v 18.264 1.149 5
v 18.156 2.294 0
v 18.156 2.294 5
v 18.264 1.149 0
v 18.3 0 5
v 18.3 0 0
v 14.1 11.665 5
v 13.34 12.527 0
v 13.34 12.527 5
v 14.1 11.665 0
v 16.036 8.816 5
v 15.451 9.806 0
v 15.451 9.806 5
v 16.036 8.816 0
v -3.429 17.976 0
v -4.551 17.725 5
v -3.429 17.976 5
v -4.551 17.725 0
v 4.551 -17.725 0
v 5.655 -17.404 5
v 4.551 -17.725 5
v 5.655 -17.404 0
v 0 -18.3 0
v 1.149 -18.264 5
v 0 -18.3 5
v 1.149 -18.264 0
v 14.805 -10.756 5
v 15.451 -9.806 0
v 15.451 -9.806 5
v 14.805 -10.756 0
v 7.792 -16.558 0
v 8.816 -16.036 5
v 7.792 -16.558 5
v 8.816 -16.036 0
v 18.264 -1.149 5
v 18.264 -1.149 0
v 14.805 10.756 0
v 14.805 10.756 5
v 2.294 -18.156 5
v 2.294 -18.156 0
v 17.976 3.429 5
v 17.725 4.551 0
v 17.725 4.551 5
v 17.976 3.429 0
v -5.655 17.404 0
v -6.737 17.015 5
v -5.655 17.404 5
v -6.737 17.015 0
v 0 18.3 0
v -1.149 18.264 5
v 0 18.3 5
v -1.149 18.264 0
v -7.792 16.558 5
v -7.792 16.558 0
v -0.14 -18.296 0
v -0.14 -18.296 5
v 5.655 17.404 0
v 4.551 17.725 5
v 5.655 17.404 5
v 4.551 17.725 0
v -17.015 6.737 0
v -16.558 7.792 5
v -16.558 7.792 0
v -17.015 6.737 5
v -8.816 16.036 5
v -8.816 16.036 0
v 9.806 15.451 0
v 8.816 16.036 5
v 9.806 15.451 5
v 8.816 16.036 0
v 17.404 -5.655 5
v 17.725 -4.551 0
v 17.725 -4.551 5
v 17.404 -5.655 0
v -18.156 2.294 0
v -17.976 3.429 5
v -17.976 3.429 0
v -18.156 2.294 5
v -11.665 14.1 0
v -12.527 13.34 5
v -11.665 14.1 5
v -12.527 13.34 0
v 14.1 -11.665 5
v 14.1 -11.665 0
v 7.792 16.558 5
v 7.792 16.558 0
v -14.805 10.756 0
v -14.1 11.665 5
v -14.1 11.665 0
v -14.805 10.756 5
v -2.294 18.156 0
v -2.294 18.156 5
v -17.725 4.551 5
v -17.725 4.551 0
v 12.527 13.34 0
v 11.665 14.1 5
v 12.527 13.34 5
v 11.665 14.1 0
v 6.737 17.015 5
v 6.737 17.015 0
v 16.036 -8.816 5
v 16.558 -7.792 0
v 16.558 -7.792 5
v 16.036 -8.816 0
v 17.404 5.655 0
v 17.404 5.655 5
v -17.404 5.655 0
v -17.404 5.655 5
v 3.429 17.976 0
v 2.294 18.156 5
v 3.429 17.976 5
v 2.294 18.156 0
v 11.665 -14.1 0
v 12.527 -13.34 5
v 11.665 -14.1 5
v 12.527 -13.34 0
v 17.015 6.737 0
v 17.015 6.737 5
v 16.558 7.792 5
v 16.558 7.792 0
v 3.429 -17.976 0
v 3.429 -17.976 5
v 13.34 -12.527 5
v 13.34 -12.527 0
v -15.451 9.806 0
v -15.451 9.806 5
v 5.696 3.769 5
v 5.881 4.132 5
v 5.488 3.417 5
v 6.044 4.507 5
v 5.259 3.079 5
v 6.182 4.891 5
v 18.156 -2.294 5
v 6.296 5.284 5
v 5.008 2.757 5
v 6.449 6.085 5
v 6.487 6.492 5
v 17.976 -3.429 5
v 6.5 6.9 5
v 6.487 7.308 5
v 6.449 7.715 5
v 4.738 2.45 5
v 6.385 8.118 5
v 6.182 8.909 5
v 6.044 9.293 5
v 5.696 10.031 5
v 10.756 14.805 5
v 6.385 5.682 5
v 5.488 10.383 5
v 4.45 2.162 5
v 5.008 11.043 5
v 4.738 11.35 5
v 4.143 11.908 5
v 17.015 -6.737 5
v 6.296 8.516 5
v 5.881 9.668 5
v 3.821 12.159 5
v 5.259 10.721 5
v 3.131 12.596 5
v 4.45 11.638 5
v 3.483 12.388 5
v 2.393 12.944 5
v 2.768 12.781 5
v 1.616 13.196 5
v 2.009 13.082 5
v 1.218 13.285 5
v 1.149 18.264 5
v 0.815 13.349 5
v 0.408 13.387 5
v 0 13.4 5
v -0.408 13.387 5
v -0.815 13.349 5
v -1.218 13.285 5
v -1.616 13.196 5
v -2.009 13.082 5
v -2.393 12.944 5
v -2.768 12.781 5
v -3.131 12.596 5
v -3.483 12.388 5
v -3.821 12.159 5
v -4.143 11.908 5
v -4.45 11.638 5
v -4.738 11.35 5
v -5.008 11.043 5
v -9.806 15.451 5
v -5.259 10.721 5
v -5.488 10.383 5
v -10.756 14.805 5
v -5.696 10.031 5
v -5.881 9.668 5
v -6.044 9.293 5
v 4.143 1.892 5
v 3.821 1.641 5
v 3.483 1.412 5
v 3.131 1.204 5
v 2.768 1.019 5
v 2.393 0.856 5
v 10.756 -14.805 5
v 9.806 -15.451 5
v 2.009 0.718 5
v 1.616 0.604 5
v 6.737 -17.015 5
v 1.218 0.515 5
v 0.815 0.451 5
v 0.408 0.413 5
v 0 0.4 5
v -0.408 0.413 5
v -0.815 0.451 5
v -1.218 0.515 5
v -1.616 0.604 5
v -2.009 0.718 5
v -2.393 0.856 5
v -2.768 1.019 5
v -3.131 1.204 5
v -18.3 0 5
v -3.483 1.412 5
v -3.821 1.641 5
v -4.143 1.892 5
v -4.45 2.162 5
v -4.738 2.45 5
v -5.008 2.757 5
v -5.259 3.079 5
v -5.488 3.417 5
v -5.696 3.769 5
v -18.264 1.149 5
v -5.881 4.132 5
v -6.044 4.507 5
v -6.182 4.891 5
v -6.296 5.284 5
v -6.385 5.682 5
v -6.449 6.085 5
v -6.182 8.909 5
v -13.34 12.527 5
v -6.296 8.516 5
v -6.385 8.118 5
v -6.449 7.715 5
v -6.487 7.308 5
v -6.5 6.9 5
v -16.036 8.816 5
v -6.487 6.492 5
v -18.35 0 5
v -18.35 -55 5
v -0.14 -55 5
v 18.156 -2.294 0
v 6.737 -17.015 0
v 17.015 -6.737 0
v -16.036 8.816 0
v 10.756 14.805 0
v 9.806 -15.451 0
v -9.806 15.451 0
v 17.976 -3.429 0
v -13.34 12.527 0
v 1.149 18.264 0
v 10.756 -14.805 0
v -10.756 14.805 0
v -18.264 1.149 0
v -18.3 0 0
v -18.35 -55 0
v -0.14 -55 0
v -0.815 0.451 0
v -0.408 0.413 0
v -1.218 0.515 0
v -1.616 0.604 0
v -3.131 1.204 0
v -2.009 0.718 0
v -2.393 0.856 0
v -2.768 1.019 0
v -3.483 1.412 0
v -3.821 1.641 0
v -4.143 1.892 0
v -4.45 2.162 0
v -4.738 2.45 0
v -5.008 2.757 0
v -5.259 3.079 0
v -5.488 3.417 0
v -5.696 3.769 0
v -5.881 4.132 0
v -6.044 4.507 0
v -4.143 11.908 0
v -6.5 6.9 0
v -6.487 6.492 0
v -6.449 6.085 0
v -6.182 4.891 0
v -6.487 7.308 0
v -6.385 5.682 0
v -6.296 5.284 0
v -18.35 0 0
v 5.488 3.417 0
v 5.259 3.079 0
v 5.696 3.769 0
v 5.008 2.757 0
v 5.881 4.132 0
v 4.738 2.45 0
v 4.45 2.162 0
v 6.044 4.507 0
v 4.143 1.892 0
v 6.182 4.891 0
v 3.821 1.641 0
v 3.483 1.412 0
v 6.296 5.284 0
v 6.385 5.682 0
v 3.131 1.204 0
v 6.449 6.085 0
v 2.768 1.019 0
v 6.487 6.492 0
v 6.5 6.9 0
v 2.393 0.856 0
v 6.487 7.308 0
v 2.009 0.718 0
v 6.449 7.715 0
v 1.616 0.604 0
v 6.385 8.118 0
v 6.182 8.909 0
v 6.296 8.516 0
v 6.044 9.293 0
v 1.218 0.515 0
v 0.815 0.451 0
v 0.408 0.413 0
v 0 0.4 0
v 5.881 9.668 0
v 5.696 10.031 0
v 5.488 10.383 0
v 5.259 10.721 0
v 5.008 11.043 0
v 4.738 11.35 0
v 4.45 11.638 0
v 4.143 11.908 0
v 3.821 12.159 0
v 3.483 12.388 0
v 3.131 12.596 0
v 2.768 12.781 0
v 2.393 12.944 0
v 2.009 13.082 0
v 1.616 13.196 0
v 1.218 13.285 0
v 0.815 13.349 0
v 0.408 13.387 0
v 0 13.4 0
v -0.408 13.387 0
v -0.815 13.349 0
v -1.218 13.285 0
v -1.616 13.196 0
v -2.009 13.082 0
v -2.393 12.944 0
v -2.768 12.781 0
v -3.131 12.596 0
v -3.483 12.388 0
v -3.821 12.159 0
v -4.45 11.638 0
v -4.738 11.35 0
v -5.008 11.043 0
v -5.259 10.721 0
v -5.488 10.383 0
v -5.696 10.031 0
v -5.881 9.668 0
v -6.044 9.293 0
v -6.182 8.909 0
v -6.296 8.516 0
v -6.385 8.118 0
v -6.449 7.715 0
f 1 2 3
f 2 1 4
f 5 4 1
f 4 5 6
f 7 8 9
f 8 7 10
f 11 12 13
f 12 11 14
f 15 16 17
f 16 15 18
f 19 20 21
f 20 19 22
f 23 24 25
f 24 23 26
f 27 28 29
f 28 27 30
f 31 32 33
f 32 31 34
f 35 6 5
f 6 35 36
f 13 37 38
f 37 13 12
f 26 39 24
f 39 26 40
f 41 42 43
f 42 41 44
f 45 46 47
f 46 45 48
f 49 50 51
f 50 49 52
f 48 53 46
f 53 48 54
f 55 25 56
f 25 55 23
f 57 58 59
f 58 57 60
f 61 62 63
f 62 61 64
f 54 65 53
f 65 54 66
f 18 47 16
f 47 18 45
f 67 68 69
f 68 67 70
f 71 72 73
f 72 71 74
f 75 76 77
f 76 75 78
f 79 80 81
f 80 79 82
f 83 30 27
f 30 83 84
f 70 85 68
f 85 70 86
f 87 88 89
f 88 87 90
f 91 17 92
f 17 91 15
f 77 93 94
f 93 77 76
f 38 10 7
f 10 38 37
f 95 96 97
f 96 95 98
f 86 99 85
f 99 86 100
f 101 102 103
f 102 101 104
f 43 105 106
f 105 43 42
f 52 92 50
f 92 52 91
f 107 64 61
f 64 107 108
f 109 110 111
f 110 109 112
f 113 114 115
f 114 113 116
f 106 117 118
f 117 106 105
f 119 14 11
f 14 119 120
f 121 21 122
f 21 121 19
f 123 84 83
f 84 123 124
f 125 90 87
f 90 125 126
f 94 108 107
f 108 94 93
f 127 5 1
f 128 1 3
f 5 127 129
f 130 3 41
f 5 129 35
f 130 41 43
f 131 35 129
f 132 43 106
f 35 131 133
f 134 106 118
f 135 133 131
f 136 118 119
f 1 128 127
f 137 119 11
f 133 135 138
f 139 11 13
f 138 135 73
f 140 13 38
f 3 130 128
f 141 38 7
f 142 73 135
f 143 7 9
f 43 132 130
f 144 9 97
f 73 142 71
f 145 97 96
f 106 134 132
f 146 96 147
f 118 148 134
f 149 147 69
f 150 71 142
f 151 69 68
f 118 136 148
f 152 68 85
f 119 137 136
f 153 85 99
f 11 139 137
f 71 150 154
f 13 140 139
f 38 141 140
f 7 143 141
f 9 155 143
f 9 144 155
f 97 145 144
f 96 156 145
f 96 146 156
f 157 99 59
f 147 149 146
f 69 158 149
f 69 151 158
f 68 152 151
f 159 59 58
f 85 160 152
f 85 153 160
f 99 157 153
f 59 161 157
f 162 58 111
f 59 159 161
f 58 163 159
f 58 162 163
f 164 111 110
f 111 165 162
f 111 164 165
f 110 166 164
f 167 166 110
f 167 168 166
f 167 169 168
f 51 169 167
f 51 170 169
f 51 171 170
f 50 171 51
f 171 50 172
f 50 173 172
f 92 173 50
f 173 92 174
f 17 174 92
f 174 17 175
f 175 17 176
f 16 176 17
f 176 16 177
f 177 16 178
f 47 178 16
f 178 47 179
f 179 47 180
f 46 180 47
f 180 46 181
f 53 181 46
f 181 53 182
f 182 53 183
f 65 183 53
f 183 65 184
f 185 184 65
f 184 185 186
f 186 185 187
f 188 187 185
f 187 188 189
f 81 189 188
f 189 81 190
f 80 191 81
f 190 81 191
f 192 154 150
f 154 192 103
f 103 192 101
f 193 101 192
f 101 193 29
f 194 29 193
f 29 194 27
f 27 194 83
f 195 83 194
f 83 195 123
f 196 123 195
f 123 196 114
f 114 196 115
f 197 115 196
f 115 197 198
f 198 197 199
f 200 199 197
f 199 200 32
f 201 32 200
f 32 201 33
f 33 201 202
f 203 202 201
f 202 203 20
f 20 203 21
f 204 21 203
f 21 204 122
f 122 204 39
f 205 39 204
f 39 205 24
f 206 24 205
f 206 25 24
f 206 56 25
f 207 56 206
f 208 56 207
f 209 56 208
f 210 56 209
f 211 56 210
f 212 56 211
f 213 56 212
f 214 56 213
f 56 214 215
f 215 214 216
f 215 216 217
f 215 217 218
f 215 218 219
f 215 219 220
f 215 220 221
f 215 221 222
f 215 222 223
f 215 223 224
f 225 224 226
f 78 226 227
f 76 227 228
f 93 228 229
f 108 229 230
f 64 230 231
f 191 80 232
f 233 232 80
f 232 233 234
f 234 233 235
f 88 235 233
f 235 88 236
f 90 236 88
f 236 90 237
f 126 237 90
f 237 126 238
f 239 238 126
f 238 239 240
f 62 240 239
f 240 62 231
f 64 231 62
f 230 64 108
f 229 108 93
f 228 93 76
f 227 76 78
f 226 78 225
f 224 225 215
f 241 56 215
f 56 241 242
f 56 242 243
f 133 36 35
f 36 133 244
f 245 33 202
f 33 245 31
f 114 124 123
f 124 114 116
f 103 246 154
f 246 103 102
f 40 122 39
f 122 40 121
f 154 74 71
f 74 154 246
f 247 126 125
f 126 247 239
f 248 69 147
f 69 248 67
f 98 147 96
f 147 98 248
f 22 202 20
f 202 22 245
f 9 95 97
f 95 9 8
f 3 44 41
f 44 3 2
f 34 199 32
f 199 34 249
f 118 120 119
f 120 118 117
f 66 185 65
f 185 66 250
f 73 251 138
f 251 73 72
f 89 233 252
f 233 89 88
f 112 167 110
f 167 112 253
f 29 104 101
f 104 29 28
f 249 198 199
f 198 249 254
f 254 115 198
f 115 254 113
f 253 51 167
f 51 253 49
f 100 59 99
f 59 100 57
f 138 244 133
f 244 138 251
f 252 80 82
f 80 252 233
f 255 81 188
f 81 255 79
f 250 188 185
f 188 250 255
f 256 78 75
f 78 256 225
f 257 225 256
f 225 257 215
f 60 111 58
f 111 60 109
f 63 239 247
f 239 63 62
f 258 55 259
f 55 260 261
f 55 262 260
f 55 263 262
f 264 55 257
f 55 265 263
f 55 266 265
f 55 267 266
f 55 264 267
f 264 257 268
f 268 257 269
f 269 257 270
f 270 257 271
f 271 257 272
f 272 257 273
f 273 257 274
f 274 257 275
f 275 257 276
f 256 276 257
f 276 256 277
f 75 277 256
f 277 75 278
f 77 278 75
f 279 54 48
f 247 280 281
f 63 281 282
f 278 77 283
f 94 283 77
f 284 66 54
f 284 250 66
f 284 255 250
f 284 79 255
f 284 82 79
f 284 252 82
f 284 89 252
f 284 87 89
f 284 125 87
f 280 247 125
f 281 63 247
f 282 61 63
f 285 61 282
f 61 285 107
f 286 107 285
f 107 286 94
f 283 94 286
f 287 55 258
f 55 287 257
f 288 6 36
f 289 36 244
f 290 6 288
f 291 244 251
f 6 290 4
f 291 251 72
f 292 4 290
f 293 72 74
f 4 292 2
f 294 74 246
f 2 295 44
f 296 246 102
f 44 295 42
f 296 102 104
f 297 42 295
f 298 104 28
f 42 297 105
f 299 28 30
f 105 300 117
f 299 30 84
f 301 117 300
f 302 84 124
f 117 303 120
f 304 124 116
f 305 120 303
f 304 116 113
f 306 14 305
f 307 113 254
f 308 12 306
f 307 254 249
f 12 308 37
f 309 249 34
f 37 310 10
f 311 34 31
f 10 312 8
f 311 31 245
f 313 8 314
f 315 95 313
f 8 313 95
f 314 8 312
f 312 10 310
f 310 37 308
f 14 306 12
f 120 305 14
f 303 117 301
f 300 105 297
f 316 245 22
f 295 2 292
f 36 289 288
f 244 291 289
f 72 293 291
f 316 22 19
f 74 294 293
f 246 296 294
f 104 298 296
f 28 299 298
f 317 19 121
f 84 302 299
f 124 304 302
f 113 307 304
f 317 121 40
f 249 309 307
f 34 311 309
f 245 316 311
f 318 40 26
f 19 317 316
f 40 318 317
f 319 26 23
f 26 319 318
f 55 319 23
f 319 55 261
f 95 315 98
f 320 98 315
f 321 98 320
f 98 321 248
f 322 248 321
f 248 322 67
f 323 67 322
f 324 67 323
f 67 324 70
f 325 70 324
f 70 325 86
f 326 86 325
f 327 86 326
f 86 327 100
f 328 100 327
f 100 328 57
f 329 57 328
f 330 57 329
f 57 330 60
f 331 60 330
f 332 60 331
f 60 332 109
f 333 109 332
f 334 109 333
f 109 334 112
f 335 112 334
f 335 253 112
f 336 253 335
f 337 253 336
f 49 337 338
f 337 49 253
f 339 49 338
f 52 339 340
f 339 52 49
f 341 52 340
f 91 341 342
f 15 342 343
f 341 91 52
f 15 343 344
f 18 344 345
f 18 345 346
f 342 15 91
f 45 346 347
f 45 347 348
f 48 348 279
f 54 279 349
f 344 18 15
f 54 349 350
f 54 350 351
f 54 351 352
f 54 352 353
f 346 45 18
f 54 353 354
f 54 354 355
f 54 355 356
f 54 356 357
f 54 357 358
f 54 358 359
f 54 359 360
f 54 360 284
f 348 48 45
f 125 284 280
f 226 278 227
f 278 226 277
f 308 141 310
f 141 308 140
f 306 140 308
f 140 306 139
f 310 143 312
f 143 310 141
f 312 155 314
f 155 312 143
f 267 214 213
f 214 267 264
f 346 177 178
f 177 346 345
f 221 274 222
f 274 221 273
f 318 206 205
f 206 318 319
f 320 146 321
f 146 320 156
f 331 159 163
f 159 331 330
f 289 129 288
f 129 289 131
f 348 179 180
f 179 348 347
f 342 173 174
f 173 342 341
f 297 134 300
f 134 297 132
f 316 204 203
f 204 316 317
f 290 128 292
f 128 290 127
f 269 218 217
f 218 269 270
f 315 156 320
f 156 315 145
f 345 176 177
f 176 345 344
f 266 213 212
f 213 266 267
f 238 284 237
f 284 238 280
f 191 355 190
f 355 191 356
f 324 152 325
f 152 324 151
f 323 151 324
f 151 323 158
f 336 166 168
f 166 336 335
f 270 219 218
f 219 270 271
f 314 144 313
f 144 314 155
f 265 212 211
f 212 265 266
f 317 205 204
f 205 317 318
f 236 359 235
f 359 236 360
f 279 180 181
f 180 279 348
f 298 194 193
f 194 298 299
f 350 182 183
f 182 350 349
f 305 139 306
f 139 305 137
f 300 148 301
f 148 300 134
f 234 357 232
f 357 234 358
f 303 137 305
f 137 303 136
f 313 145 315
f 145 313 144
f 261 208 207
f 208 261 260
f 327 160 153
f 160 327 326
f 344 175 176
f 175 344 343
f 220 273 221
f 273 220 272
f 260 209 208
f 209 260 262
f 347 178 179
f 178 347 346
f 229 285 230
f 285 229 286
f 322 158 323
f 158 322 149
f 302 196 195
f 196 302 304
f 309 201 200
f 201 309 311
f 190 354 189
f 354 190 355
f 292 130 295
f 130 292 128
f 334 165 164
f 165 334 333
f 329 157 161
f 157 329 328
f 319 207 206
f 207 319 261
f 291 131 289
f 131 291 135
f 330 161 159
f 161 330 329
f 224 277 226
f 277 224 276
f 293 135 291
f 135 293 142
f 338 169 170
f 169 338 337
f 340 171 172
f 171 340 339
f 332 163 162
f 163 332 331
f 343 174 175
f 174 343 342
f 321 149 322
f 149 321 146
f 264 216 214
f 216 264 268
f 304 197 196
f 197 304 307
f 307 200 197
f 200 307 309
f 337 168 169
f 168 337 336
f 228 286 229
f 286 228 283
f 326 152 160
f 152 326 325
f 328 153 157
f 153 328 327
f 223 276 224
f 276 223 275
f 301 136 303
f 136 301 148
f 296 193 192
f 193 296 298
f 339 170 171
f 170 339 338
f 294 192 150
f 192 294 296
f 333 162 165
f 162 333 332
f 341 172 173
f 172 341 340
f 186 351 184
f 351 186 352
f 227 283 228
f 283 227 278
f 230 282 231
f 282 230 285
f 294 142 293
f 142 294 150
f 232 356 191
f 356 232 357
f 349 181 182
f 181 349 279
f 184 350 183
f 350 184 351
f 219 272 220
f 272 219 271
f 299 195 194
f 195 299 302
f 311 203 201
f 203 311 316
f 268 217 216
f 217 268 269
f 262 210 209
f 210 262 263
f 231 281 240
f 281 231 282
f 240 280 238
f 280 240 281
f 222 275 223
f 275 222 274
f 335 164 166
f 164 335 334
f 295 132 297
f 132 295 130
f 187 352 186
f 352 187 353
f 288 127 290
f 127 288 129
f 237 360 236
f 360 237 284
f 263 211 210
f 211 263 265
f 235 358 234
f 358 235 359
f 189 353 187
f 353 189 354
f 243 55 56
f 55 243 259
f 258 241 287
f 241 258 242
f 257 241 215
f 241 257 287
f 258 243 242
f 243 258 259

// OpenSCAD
$fn = 100;

union()
{
difference()
{   translate([-36.7/2,-55,0])
    {
        cube([18.21,55,5]);
    }   
}
       
difference()
{   cylinder(r = 37/2-0.2, h = 5);

    translate([0,6.9,0])
        {
            cylinder(r = 13/2, h = 5);
        }
}   
}
